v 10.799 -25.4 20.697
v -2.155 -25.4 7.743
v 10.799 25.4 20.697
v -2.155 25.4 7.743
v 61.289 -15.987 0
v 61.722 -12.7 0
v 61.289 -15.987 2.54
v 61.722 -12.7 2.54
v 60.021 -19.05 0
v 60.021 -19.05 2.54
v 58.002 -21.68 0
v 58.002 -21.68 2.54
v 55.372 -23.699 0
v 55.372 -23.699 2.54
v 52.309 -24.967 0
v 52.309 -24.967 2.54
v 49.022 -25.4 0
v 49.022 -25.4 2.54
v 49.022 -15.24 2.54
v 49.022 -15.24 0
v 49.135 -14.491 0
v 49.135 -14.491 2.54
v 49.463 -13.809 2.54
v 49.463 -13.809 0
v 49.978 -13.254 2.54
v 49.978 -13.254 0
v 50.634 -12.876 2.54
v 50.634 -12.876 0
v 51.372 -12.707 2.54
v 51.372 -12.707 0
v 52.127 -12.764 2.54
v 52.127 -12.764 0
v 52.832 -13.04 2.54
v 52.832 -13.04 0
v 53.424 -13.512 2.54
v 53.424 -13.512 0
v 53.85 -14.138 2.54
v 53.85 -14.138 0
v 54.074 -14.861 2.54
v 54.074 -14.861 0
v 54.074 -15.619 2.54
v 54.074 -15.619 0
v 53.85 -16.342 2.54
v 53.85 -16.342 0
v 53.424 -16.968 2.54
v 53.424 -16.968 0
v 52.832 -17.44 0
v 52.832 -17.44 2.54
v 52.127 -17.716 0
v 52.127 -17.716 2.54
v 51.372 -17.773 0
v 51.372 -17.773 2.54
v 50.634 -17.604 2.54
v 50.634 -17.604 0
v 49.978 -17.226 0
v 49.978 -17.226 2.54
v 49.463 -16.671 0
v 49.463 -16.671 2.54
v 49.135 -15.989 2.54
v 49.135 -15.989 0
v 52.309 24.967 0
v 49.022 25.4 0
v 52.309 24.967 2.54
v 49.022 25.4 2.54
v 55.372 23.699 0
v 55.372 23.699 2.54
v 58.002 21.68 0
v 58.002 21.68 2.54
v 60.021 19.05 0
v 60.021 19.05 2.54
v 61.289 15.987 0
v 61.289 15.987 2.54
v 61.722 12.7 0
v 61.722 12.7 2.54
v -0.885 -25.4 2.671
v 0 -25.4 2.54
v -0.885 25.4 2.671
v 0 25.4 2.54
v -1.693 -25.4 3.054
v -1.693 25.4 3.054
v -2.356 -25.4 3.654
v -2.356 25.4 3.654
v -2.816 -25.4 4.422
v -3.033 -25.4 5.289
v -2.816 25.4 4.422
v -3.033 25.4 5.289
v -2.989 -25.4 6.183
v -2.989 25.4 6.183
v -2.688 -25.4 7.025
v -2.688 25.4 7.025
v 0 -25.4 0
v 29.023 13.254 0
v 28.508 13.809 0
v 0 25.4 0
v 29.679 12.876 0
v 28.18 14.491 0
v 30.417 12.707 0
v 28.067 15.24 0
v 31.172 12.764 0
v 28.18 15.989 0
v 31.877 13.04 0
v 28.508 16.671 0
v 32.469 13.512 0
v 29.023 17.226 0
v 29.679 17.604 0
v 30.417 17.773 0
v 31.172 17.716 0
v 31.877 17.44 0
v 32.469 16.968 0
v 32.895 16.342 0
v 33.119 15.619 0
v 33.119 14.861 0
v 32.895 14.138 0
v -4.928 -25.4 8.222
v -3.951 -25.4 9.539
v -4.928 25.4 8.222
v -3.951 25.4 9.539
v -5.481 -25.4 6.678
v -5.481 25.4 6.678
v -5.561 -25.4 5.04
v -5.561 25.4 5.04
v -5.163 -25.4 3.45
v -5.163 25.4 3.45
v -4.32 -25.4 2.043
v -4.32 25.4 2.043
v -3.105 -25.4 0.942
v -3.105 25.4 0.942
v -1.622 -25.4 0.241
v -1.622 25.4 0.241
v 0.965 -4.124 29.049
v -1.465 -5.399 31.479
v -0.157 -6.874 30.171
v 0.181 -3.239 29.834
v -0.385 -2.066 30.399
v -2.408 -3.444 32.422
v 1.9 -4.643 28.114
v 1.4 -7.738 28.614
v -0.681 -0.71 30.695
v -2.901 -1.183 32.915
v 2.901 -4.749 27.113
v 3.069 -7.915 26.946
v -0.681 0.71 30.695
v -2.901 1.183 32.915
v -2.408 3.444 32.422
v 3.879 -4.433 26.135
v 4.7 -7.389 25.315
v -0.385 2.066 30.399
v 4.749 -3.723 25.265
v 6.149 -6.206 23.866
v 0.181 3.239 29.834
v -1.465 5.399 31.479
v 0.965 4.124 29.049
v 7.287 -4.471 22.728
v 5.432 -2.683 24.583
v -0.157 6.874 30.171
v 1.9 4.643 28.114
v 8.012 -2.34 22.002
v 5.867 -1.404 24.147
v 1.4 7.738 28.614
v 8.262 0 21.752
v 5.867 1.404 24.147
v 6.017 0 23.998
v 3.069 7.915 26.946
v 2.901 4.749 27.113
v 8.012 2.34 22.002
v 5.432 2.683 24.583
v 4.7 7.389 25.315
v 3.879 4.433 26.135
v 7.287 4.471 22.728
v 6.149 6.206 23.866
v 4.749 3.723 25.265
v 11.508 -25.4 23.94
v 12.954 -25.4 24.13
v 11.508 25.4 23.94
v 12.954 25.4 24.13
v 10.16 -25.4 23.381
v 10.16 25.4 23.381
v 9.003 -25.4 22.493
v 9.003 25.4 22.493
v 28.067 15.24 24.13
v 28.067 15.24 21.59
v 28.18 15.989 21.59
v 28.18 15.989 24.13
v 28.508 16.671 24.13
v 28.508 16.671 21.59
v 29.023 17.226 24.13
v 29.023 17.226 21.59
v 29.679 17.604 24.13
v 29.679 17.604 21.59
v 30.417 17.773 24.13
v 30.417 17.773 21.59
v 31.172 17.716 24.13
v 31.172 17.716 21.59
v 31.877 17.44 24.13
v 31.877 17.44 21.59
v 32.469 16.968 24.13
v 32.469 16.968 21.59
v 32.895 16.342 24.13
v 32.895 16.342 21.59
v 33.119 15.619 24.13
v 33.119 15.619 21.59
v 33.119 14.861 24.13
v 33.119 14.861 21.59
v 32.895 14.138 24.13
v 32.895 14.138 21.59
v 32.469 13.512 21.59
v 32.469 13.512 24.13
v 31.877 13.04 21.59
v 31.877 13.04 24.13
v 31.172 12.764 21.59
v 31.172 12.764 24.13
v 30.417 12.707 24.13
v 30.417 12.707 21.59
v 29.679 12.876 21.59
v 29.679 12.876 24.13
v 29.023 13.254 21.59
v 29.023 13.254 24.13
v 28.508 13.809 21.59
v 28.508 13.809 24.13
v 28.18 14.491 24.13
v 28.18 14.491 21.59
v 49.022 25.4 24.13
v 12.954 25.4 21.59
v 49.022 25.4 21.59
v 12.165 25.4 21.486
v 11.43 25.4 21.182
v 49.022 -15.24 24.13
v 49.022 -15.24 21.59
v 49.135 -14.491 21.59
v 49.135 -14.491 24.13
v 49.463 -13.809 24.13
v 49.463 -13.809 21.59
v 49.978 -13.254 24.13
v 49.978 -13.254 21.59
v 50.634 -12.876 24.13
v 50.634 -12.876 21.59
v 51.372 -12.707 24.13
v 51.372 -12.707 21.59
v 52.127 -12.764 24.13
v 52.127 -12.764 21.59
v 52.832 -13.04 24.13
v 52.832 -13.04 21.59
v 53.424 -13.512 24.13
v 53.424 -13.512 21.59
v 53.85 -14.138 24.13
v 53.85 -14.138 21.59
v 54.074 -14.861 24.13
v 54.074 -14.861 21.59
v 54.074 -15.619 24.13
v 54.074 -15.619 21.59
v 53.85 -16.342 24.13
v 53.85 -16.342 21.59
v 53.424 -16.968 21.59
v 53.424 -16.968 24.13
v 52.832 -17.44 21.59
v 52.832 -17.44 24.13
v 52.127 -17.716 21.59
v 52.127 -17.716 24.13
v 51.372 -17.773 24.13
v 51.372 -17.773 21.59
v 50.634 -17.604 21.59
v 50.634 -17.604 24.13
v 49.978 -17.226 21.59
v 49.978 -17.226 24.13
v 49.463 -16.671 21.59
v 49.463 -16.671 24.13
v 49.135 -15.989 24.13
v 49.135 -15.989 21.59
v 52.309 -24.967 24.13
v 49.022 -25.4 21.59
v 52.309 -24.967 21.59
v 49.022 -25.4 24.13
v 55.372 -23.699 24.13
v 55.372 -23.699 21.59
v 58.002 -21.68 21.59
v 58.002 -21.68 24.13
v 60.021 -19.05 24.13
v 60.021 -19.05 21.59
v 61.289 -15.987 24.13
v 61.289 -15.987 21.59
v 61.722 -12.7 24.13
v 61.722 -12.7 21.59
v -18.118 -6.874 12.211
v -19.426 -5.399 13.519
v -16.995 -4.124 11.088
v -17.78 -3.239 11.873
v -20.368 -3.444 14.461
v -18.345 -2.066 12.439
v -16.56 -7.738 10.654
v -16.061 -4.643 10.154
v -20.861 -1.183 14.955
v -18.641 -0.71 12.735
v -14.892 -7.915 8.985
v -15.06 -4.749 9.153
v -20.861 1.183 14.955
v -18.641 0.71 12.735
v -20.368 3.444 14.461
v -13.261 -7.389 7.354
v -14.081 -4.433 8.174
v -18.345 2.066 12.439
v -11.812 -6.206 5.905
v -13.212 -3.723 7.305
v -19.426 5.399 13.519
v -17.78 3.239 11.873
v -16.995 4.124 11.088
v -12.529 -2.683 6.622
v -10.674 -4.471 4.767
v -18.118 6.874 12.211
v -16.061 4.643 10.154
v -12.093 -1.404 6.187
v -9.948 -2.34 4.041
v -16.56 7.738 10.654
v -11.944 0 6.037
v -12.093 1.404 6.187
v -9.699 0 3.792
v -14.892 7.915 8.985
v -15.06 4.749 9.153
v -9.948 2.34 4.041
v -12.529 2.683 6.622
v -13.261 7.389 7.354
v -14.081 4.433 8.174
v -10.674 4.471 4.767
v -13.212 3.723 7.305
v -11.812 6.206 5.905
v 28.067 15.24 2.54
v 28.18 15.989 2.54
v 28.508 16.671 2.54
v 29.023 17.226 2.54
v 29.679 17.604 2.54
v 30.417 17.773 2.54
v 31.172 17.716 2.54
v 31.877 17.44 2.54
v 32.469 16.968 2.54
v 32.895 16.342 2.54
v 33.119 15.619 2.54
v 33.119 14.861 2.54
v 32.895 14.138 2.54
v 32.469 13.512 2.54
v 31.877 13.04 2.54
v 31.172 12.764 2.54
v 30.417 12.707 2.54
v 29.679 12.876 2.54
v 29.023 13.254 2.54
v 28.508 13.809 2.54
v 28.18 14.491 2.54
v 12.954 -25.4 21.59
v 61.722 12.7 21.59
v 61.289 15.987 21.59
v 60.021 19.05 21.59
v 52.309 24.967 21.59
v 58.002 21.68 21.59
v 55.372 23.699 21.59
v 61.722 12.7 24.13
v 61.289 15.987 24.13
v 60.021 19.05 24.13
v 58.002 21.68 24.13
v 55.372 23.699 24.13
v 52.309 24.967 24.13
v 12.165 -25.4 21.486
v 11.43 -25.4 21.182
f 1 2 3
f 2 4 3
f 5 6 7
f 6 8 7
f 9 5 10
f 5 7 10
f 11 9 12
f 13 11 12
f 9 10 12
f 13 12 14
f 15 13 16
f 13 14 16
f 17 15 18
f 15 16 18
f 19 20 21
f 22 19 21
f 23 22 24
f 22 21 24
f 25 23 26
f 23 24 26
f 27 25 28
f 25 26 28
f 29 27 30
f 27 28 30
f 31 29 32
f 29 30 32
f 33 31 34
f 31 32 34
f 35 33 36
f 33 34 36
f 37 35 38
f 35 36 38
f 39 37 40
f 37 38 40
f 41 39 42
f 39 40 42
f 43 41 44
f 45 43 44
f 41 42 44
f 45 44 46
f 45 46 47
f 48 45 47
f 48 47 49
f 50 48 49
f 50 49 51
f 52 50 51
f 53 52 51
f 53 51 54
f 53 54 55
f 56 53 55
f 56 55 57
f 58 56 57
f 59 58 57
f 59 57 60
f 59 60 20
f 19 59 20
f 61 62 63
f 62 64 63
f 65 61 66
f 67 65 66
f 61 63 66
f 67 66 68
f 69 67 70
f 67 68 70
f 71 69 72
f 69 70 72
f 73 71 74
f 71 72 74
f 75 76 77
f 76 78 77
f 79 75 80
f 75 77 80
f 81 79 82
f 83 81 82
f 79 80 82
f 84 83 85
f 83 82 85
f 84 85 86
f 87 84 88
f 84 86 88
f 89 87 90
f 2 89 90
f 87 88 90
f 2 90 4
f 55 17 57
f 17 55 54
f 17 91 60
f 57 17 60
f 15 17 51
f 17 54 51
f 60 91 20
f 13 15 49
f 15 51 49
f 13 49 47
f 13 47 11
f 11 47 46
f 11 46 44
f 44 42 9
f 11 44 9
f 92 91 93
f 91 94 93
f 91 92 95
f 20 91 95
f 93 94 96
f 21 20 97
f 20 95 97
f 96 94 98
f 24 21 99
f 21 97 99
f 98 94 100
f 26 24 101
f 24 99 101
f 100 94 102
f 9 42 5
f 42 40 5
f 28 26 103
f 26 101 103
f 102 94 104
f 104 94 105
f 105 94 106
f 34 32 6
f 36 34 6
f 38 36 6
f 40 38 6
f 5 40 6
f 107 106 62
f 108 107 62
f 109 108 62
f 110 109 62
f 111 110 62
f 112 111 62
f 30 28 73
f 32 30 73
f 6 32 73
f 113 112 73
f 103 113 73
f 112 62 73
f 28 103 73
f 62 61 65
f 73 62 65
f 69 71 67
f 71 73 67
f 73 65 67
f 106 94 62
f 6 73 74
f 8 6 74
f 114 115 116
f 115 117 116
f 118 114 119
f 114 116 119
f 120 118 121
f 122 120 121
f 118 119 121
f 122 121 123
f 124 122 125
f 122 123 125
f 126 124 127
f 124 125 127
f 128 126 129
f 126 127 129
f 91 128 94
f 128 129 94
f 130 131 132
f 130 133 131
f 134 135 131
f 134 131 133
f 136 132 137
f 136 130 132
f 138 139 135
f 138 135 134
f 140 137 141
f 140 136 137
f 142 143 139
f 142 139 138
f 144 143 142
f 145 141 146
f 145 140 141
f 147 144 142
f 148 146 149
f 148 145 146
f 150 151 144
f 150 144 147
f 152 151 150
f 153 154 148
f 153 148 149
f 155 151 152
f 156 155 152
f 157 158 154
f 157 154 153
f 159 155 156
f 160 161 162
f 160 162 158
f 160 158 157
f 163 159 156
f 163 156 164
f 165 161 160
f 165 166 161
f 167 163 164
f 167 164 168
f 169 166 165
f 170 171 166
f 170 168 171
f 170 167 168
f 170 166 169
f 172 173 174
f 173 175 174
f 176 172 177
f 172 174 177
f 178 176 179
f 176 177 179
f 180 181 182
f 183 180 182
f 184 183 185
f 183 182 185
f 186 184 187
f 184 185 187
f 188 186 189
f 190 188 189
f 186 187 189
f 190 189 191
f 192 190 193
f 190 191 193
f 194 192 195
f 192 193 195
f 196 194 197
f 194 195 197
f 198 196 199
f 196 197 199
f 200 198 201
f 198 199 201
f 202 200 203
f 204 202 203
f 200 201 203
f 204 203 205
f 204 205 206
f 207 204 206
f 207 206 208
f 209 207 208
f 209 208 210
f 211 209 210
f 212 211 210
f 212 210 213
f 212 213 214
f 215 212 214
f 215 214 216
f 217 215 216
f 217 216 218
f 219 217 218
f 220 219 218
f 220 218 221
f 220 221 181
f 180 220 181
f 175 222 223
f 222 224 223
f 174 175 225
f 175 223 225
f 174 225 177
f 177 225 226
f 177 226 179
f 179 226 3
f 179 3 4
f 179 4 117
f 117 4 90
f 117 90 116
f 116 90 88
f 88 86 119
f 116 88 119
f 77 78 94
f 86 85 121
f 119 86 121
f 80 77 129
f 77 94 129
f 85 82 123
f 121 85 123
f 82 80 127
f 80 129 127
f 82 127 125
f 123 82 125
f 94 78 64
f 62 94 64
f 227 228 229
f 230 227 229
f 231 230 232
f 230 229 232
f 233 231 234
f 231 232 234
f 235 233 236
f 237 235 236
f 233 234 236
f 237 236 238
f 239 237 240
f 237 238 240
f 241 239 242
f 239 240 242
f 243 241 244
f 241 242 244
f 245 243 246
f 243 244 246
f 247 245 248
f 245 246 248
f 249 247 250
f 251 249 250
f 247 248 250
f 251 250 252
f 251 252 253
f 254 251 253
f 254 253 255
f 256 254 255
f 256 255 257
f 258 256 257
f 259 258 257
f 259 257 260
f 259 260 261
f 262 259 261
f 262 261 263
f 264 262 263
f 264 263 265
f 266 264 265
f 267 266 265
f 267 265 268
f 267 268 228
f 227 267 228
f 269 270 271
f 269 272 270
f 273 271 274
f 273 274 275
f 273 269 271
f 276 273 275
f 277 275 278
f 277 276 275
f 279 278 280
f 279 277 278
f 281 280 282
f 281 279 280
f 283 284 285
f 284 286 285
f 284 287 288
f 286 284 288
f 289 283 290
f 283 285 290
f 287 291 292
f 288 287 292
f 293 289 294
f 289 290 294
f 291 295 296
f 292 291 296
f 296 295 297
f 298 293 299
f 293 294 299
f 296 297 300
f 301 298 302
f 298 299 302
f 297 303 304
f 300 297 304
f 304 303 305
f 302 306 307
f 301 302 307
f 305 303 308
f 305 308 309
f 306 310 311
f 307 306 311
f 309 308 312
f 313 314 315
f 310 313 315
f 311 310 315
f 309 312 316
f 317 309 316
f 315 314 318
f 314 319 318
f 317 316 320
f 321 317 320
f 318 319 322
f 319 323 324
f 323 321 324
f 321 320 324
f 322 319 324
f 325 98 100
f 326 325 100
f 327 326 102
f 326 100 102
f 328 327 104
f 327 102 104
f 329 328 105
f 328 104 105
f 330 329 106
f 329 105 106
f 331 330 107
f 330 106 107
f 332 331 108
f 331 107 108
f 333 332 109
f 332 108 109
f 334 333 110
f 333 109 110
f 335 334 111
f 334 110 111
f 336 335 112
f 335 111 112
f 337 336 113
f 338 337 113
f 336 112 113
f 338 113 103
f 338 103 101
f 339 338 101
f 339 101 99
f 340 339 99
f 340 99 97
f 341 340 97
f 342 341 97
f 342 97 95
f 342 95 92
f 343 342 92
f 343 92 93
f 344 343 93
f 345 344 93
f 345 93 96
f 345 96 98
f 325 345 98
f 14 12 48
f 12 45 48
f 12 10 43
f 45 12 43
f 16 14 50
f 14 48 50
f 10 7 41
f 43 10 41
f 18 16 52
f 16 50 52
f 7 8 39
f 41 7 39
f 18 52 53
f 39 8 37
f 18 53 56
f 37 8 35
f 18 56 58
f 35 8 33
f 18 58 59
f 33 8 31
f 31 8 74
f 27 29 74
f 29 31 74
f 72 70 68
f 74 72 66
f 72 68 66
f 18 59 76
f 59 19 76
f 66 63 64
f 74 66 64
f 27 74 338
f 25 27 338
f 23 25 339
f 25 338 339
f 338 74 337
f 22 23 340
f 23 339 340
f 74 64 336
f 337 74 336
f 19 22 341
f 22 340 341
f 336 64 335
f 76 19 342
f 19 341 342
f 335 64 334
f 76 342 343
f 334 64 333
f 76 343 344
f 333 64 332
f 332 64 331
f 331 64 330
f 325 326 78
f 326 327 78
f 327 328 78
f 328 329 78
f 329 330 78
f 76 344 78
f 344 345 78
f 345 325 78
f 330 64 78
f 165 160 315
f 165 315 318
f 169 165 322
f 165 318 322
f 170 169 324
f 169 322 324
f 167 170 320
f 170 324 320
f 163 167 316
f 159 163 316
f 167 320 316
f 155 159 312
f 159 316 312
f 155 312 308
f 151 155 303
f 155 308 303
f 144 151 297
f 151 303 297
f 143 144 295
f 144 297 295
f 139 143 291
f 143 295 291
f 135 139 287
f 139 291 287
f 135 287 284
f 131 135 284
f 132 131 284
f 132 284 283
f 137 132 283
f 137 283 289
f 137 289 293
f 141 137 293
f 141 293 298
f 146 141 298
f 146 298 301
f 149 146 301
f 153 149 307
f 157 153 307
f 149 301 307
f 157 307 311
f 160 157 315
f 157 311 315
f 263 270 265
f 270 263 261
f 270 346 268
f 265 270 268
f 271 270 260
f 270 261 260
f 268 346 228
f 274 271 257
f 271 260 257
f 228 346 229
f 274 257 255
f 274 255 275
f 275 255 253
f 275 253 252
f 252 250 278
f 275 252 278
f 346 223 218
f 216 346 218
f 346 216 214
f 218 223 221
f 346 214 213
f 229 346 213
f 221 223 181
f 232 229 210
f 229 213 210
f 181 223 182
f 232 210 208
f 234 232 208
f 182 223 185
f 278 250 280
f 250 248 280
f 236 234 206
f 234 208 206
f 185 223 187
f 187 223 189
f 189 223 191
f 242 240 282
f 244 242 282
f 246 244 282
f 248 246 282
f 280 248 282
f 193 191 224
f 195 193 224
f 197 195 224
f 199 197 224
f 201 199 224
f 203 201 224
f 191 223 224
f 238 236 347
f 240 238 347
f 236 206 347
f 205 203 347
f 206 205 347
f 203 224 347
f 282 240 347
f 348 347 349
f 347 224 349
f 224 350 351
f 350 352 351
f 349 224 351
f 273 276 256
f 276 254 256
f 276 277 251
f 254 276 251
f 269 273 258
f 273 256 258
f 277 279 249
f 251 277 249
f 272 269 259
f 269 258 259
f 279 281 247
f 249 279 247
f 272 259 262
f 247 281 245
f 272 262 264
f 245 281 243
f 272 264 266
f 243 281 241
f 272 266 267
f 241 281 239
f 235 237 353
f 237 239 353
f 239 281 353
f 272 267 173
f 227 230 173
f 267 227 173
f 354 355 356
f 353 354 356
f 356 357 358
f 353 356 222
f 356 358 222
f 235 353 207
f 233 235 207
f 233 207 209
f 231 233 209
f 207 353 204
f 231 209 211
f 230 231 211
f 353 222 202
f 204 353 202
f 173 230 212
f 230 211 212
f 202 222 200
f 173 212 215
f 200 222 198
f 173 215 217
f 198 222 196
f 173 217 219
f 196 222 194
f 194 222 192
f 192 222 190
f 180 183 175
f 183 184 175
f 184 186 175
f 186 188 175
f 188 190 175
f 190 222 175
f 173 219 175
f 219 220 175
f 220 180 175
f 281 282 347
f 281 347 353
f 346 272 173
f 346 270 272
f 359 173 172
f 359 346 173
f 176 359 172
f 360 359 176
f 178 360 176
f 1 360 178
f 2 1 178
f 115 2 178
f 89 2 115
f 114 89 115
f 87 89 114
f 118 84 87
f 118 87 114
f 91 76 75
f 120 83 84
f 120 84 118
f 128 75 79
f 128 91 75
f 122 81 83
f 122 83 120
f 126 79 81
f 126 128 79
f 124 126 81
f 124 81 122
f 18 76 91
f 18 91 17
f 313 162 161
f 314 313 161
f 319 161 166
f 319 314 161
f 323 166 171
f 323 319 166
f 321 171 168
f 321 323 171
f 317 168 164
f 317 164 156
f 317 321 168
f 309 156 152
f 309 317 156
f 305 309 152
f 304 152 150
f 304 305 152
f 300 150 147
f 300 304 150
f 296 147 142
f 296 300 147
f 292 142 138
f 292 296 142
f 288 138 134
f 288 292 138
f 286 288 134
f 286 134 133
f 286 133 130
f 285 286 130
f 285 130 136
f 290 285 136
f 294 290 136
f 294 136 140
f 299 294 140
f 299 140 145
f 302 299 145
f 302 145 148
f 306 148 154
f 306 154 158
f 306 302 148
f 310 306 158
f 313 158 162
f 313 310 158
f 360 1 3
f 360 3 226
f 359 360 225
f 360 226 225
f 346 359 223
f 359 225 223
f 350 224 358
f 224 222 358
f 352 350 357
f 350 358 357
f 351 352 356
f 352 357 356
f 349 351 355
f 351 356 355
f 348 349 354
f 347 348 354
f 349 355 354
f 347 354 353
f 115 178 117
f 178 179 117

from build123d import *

# Parameters (mm, degrees)
EXTRUDE_THIN1_DEPTH = 25.4
SKETCH2_R           = 7.9375
SKETCH2_R_2         = 4.7625
BOSS_EXTRUDE2_DEPTH = 25.4
FILLET1_R           = 12.7
SKETCH4_R           = 2.54
CUT_EXTRUDE1_DEPTH  = 33.977781169


with BuildPart() as part:
    # Sketch1 → Extrude-Thin1 (new body, symmetric)
    with BuildSketch(Plane(origin=(0, 0, 0), x_dir=(1, 0, 0), z_dir=(0, 1, 0))):
        with BuildLine():
            Line((61.722, -24.13), (12.954, -24.13))
            ThreePointArc((12.954, -24.13), (10.81556498, -23.704638828), (9.002687307, -22.493312693))
            Line((9.002687307, -22.493312693), (-3.951312693, -9.539312693))
            ThreePointArc((-3.951312693, -9.539312693), (-5.162638828, -3.44956498), (0, 0))
            Line((0, 0), (61.722, 0))
            Line((61.722, 0), (61.722, -2.54))
            Line((61.722, -2.54), (0, -2.54))
            ThreePointArc((0, -2.54), (-2.815984815, -4.421580898), (-2.155261469, -7.743261469))
            Line((-2.155261469, -7.743261469), (10.798738531, -20.697261469))
            ThreePointArc((10.798738531, -20.697261469), (11.787580898, -21.357984815), (12.954, -21.59))
            Line((12.954, -21.59), (61.722, -21.59))
            Line((61.722, -21.59), (61.722, -24.13))
        make_face()
    extrude(amount=EXTRUDE_THIN1_DEPTH, both=True)

    # Fillet1
    fillet1_edges = [part.edges().sort_by_distance(p)[0] for p in [
        (61.722, -25.4, 1.27),
        (61.722, -25.4, 22.86),
        (61.722, 25.4, 1.27),
        (61.722, 25.4, 22.86),
    ]]
    fillet(fillet1_edges, radius=FILLET1_R)

    # Sketch4 → Cut-Extrude1 (cut, through all)
    with BuildSketch(Plane(origin=(0, 0, 0), x_dir=(-1, 0, 0), z_dir=(0, 0, -1))):
        with Locations((-51.562, -15.24)):
            Circle(SKETCH4_R)
        with Locations((-30.607, 15.24)):
            Circle(SKETCH4_R)
    extrude(amount=-CUT_EXTRUDE1_DEPTH, mode=Mode.SUBTRACT)


with BuildPart() as body_2:
    # Sketch2 → Boss-Extrude2 (new body)
    with BuildSketch(Plane(origin=(-9.698676611, 25.4, 3.791948776), x_dir=(0.707106781, 0, -0.707106781), z_dir=(0.707106781, 0, 0.707106781))):
        with Locations((-7.9375, -25.4)):
            Circle(SKETCH2_R)
        with Locations((-7.9375, -25.4)):
            Circle(SKETCH2_R_2, mode=Mode.SUBTRACT)
    extrude(amount=BOSS_EXTRUDE2_DEPTH)


solid = Compound([part.part, body_2.part])
